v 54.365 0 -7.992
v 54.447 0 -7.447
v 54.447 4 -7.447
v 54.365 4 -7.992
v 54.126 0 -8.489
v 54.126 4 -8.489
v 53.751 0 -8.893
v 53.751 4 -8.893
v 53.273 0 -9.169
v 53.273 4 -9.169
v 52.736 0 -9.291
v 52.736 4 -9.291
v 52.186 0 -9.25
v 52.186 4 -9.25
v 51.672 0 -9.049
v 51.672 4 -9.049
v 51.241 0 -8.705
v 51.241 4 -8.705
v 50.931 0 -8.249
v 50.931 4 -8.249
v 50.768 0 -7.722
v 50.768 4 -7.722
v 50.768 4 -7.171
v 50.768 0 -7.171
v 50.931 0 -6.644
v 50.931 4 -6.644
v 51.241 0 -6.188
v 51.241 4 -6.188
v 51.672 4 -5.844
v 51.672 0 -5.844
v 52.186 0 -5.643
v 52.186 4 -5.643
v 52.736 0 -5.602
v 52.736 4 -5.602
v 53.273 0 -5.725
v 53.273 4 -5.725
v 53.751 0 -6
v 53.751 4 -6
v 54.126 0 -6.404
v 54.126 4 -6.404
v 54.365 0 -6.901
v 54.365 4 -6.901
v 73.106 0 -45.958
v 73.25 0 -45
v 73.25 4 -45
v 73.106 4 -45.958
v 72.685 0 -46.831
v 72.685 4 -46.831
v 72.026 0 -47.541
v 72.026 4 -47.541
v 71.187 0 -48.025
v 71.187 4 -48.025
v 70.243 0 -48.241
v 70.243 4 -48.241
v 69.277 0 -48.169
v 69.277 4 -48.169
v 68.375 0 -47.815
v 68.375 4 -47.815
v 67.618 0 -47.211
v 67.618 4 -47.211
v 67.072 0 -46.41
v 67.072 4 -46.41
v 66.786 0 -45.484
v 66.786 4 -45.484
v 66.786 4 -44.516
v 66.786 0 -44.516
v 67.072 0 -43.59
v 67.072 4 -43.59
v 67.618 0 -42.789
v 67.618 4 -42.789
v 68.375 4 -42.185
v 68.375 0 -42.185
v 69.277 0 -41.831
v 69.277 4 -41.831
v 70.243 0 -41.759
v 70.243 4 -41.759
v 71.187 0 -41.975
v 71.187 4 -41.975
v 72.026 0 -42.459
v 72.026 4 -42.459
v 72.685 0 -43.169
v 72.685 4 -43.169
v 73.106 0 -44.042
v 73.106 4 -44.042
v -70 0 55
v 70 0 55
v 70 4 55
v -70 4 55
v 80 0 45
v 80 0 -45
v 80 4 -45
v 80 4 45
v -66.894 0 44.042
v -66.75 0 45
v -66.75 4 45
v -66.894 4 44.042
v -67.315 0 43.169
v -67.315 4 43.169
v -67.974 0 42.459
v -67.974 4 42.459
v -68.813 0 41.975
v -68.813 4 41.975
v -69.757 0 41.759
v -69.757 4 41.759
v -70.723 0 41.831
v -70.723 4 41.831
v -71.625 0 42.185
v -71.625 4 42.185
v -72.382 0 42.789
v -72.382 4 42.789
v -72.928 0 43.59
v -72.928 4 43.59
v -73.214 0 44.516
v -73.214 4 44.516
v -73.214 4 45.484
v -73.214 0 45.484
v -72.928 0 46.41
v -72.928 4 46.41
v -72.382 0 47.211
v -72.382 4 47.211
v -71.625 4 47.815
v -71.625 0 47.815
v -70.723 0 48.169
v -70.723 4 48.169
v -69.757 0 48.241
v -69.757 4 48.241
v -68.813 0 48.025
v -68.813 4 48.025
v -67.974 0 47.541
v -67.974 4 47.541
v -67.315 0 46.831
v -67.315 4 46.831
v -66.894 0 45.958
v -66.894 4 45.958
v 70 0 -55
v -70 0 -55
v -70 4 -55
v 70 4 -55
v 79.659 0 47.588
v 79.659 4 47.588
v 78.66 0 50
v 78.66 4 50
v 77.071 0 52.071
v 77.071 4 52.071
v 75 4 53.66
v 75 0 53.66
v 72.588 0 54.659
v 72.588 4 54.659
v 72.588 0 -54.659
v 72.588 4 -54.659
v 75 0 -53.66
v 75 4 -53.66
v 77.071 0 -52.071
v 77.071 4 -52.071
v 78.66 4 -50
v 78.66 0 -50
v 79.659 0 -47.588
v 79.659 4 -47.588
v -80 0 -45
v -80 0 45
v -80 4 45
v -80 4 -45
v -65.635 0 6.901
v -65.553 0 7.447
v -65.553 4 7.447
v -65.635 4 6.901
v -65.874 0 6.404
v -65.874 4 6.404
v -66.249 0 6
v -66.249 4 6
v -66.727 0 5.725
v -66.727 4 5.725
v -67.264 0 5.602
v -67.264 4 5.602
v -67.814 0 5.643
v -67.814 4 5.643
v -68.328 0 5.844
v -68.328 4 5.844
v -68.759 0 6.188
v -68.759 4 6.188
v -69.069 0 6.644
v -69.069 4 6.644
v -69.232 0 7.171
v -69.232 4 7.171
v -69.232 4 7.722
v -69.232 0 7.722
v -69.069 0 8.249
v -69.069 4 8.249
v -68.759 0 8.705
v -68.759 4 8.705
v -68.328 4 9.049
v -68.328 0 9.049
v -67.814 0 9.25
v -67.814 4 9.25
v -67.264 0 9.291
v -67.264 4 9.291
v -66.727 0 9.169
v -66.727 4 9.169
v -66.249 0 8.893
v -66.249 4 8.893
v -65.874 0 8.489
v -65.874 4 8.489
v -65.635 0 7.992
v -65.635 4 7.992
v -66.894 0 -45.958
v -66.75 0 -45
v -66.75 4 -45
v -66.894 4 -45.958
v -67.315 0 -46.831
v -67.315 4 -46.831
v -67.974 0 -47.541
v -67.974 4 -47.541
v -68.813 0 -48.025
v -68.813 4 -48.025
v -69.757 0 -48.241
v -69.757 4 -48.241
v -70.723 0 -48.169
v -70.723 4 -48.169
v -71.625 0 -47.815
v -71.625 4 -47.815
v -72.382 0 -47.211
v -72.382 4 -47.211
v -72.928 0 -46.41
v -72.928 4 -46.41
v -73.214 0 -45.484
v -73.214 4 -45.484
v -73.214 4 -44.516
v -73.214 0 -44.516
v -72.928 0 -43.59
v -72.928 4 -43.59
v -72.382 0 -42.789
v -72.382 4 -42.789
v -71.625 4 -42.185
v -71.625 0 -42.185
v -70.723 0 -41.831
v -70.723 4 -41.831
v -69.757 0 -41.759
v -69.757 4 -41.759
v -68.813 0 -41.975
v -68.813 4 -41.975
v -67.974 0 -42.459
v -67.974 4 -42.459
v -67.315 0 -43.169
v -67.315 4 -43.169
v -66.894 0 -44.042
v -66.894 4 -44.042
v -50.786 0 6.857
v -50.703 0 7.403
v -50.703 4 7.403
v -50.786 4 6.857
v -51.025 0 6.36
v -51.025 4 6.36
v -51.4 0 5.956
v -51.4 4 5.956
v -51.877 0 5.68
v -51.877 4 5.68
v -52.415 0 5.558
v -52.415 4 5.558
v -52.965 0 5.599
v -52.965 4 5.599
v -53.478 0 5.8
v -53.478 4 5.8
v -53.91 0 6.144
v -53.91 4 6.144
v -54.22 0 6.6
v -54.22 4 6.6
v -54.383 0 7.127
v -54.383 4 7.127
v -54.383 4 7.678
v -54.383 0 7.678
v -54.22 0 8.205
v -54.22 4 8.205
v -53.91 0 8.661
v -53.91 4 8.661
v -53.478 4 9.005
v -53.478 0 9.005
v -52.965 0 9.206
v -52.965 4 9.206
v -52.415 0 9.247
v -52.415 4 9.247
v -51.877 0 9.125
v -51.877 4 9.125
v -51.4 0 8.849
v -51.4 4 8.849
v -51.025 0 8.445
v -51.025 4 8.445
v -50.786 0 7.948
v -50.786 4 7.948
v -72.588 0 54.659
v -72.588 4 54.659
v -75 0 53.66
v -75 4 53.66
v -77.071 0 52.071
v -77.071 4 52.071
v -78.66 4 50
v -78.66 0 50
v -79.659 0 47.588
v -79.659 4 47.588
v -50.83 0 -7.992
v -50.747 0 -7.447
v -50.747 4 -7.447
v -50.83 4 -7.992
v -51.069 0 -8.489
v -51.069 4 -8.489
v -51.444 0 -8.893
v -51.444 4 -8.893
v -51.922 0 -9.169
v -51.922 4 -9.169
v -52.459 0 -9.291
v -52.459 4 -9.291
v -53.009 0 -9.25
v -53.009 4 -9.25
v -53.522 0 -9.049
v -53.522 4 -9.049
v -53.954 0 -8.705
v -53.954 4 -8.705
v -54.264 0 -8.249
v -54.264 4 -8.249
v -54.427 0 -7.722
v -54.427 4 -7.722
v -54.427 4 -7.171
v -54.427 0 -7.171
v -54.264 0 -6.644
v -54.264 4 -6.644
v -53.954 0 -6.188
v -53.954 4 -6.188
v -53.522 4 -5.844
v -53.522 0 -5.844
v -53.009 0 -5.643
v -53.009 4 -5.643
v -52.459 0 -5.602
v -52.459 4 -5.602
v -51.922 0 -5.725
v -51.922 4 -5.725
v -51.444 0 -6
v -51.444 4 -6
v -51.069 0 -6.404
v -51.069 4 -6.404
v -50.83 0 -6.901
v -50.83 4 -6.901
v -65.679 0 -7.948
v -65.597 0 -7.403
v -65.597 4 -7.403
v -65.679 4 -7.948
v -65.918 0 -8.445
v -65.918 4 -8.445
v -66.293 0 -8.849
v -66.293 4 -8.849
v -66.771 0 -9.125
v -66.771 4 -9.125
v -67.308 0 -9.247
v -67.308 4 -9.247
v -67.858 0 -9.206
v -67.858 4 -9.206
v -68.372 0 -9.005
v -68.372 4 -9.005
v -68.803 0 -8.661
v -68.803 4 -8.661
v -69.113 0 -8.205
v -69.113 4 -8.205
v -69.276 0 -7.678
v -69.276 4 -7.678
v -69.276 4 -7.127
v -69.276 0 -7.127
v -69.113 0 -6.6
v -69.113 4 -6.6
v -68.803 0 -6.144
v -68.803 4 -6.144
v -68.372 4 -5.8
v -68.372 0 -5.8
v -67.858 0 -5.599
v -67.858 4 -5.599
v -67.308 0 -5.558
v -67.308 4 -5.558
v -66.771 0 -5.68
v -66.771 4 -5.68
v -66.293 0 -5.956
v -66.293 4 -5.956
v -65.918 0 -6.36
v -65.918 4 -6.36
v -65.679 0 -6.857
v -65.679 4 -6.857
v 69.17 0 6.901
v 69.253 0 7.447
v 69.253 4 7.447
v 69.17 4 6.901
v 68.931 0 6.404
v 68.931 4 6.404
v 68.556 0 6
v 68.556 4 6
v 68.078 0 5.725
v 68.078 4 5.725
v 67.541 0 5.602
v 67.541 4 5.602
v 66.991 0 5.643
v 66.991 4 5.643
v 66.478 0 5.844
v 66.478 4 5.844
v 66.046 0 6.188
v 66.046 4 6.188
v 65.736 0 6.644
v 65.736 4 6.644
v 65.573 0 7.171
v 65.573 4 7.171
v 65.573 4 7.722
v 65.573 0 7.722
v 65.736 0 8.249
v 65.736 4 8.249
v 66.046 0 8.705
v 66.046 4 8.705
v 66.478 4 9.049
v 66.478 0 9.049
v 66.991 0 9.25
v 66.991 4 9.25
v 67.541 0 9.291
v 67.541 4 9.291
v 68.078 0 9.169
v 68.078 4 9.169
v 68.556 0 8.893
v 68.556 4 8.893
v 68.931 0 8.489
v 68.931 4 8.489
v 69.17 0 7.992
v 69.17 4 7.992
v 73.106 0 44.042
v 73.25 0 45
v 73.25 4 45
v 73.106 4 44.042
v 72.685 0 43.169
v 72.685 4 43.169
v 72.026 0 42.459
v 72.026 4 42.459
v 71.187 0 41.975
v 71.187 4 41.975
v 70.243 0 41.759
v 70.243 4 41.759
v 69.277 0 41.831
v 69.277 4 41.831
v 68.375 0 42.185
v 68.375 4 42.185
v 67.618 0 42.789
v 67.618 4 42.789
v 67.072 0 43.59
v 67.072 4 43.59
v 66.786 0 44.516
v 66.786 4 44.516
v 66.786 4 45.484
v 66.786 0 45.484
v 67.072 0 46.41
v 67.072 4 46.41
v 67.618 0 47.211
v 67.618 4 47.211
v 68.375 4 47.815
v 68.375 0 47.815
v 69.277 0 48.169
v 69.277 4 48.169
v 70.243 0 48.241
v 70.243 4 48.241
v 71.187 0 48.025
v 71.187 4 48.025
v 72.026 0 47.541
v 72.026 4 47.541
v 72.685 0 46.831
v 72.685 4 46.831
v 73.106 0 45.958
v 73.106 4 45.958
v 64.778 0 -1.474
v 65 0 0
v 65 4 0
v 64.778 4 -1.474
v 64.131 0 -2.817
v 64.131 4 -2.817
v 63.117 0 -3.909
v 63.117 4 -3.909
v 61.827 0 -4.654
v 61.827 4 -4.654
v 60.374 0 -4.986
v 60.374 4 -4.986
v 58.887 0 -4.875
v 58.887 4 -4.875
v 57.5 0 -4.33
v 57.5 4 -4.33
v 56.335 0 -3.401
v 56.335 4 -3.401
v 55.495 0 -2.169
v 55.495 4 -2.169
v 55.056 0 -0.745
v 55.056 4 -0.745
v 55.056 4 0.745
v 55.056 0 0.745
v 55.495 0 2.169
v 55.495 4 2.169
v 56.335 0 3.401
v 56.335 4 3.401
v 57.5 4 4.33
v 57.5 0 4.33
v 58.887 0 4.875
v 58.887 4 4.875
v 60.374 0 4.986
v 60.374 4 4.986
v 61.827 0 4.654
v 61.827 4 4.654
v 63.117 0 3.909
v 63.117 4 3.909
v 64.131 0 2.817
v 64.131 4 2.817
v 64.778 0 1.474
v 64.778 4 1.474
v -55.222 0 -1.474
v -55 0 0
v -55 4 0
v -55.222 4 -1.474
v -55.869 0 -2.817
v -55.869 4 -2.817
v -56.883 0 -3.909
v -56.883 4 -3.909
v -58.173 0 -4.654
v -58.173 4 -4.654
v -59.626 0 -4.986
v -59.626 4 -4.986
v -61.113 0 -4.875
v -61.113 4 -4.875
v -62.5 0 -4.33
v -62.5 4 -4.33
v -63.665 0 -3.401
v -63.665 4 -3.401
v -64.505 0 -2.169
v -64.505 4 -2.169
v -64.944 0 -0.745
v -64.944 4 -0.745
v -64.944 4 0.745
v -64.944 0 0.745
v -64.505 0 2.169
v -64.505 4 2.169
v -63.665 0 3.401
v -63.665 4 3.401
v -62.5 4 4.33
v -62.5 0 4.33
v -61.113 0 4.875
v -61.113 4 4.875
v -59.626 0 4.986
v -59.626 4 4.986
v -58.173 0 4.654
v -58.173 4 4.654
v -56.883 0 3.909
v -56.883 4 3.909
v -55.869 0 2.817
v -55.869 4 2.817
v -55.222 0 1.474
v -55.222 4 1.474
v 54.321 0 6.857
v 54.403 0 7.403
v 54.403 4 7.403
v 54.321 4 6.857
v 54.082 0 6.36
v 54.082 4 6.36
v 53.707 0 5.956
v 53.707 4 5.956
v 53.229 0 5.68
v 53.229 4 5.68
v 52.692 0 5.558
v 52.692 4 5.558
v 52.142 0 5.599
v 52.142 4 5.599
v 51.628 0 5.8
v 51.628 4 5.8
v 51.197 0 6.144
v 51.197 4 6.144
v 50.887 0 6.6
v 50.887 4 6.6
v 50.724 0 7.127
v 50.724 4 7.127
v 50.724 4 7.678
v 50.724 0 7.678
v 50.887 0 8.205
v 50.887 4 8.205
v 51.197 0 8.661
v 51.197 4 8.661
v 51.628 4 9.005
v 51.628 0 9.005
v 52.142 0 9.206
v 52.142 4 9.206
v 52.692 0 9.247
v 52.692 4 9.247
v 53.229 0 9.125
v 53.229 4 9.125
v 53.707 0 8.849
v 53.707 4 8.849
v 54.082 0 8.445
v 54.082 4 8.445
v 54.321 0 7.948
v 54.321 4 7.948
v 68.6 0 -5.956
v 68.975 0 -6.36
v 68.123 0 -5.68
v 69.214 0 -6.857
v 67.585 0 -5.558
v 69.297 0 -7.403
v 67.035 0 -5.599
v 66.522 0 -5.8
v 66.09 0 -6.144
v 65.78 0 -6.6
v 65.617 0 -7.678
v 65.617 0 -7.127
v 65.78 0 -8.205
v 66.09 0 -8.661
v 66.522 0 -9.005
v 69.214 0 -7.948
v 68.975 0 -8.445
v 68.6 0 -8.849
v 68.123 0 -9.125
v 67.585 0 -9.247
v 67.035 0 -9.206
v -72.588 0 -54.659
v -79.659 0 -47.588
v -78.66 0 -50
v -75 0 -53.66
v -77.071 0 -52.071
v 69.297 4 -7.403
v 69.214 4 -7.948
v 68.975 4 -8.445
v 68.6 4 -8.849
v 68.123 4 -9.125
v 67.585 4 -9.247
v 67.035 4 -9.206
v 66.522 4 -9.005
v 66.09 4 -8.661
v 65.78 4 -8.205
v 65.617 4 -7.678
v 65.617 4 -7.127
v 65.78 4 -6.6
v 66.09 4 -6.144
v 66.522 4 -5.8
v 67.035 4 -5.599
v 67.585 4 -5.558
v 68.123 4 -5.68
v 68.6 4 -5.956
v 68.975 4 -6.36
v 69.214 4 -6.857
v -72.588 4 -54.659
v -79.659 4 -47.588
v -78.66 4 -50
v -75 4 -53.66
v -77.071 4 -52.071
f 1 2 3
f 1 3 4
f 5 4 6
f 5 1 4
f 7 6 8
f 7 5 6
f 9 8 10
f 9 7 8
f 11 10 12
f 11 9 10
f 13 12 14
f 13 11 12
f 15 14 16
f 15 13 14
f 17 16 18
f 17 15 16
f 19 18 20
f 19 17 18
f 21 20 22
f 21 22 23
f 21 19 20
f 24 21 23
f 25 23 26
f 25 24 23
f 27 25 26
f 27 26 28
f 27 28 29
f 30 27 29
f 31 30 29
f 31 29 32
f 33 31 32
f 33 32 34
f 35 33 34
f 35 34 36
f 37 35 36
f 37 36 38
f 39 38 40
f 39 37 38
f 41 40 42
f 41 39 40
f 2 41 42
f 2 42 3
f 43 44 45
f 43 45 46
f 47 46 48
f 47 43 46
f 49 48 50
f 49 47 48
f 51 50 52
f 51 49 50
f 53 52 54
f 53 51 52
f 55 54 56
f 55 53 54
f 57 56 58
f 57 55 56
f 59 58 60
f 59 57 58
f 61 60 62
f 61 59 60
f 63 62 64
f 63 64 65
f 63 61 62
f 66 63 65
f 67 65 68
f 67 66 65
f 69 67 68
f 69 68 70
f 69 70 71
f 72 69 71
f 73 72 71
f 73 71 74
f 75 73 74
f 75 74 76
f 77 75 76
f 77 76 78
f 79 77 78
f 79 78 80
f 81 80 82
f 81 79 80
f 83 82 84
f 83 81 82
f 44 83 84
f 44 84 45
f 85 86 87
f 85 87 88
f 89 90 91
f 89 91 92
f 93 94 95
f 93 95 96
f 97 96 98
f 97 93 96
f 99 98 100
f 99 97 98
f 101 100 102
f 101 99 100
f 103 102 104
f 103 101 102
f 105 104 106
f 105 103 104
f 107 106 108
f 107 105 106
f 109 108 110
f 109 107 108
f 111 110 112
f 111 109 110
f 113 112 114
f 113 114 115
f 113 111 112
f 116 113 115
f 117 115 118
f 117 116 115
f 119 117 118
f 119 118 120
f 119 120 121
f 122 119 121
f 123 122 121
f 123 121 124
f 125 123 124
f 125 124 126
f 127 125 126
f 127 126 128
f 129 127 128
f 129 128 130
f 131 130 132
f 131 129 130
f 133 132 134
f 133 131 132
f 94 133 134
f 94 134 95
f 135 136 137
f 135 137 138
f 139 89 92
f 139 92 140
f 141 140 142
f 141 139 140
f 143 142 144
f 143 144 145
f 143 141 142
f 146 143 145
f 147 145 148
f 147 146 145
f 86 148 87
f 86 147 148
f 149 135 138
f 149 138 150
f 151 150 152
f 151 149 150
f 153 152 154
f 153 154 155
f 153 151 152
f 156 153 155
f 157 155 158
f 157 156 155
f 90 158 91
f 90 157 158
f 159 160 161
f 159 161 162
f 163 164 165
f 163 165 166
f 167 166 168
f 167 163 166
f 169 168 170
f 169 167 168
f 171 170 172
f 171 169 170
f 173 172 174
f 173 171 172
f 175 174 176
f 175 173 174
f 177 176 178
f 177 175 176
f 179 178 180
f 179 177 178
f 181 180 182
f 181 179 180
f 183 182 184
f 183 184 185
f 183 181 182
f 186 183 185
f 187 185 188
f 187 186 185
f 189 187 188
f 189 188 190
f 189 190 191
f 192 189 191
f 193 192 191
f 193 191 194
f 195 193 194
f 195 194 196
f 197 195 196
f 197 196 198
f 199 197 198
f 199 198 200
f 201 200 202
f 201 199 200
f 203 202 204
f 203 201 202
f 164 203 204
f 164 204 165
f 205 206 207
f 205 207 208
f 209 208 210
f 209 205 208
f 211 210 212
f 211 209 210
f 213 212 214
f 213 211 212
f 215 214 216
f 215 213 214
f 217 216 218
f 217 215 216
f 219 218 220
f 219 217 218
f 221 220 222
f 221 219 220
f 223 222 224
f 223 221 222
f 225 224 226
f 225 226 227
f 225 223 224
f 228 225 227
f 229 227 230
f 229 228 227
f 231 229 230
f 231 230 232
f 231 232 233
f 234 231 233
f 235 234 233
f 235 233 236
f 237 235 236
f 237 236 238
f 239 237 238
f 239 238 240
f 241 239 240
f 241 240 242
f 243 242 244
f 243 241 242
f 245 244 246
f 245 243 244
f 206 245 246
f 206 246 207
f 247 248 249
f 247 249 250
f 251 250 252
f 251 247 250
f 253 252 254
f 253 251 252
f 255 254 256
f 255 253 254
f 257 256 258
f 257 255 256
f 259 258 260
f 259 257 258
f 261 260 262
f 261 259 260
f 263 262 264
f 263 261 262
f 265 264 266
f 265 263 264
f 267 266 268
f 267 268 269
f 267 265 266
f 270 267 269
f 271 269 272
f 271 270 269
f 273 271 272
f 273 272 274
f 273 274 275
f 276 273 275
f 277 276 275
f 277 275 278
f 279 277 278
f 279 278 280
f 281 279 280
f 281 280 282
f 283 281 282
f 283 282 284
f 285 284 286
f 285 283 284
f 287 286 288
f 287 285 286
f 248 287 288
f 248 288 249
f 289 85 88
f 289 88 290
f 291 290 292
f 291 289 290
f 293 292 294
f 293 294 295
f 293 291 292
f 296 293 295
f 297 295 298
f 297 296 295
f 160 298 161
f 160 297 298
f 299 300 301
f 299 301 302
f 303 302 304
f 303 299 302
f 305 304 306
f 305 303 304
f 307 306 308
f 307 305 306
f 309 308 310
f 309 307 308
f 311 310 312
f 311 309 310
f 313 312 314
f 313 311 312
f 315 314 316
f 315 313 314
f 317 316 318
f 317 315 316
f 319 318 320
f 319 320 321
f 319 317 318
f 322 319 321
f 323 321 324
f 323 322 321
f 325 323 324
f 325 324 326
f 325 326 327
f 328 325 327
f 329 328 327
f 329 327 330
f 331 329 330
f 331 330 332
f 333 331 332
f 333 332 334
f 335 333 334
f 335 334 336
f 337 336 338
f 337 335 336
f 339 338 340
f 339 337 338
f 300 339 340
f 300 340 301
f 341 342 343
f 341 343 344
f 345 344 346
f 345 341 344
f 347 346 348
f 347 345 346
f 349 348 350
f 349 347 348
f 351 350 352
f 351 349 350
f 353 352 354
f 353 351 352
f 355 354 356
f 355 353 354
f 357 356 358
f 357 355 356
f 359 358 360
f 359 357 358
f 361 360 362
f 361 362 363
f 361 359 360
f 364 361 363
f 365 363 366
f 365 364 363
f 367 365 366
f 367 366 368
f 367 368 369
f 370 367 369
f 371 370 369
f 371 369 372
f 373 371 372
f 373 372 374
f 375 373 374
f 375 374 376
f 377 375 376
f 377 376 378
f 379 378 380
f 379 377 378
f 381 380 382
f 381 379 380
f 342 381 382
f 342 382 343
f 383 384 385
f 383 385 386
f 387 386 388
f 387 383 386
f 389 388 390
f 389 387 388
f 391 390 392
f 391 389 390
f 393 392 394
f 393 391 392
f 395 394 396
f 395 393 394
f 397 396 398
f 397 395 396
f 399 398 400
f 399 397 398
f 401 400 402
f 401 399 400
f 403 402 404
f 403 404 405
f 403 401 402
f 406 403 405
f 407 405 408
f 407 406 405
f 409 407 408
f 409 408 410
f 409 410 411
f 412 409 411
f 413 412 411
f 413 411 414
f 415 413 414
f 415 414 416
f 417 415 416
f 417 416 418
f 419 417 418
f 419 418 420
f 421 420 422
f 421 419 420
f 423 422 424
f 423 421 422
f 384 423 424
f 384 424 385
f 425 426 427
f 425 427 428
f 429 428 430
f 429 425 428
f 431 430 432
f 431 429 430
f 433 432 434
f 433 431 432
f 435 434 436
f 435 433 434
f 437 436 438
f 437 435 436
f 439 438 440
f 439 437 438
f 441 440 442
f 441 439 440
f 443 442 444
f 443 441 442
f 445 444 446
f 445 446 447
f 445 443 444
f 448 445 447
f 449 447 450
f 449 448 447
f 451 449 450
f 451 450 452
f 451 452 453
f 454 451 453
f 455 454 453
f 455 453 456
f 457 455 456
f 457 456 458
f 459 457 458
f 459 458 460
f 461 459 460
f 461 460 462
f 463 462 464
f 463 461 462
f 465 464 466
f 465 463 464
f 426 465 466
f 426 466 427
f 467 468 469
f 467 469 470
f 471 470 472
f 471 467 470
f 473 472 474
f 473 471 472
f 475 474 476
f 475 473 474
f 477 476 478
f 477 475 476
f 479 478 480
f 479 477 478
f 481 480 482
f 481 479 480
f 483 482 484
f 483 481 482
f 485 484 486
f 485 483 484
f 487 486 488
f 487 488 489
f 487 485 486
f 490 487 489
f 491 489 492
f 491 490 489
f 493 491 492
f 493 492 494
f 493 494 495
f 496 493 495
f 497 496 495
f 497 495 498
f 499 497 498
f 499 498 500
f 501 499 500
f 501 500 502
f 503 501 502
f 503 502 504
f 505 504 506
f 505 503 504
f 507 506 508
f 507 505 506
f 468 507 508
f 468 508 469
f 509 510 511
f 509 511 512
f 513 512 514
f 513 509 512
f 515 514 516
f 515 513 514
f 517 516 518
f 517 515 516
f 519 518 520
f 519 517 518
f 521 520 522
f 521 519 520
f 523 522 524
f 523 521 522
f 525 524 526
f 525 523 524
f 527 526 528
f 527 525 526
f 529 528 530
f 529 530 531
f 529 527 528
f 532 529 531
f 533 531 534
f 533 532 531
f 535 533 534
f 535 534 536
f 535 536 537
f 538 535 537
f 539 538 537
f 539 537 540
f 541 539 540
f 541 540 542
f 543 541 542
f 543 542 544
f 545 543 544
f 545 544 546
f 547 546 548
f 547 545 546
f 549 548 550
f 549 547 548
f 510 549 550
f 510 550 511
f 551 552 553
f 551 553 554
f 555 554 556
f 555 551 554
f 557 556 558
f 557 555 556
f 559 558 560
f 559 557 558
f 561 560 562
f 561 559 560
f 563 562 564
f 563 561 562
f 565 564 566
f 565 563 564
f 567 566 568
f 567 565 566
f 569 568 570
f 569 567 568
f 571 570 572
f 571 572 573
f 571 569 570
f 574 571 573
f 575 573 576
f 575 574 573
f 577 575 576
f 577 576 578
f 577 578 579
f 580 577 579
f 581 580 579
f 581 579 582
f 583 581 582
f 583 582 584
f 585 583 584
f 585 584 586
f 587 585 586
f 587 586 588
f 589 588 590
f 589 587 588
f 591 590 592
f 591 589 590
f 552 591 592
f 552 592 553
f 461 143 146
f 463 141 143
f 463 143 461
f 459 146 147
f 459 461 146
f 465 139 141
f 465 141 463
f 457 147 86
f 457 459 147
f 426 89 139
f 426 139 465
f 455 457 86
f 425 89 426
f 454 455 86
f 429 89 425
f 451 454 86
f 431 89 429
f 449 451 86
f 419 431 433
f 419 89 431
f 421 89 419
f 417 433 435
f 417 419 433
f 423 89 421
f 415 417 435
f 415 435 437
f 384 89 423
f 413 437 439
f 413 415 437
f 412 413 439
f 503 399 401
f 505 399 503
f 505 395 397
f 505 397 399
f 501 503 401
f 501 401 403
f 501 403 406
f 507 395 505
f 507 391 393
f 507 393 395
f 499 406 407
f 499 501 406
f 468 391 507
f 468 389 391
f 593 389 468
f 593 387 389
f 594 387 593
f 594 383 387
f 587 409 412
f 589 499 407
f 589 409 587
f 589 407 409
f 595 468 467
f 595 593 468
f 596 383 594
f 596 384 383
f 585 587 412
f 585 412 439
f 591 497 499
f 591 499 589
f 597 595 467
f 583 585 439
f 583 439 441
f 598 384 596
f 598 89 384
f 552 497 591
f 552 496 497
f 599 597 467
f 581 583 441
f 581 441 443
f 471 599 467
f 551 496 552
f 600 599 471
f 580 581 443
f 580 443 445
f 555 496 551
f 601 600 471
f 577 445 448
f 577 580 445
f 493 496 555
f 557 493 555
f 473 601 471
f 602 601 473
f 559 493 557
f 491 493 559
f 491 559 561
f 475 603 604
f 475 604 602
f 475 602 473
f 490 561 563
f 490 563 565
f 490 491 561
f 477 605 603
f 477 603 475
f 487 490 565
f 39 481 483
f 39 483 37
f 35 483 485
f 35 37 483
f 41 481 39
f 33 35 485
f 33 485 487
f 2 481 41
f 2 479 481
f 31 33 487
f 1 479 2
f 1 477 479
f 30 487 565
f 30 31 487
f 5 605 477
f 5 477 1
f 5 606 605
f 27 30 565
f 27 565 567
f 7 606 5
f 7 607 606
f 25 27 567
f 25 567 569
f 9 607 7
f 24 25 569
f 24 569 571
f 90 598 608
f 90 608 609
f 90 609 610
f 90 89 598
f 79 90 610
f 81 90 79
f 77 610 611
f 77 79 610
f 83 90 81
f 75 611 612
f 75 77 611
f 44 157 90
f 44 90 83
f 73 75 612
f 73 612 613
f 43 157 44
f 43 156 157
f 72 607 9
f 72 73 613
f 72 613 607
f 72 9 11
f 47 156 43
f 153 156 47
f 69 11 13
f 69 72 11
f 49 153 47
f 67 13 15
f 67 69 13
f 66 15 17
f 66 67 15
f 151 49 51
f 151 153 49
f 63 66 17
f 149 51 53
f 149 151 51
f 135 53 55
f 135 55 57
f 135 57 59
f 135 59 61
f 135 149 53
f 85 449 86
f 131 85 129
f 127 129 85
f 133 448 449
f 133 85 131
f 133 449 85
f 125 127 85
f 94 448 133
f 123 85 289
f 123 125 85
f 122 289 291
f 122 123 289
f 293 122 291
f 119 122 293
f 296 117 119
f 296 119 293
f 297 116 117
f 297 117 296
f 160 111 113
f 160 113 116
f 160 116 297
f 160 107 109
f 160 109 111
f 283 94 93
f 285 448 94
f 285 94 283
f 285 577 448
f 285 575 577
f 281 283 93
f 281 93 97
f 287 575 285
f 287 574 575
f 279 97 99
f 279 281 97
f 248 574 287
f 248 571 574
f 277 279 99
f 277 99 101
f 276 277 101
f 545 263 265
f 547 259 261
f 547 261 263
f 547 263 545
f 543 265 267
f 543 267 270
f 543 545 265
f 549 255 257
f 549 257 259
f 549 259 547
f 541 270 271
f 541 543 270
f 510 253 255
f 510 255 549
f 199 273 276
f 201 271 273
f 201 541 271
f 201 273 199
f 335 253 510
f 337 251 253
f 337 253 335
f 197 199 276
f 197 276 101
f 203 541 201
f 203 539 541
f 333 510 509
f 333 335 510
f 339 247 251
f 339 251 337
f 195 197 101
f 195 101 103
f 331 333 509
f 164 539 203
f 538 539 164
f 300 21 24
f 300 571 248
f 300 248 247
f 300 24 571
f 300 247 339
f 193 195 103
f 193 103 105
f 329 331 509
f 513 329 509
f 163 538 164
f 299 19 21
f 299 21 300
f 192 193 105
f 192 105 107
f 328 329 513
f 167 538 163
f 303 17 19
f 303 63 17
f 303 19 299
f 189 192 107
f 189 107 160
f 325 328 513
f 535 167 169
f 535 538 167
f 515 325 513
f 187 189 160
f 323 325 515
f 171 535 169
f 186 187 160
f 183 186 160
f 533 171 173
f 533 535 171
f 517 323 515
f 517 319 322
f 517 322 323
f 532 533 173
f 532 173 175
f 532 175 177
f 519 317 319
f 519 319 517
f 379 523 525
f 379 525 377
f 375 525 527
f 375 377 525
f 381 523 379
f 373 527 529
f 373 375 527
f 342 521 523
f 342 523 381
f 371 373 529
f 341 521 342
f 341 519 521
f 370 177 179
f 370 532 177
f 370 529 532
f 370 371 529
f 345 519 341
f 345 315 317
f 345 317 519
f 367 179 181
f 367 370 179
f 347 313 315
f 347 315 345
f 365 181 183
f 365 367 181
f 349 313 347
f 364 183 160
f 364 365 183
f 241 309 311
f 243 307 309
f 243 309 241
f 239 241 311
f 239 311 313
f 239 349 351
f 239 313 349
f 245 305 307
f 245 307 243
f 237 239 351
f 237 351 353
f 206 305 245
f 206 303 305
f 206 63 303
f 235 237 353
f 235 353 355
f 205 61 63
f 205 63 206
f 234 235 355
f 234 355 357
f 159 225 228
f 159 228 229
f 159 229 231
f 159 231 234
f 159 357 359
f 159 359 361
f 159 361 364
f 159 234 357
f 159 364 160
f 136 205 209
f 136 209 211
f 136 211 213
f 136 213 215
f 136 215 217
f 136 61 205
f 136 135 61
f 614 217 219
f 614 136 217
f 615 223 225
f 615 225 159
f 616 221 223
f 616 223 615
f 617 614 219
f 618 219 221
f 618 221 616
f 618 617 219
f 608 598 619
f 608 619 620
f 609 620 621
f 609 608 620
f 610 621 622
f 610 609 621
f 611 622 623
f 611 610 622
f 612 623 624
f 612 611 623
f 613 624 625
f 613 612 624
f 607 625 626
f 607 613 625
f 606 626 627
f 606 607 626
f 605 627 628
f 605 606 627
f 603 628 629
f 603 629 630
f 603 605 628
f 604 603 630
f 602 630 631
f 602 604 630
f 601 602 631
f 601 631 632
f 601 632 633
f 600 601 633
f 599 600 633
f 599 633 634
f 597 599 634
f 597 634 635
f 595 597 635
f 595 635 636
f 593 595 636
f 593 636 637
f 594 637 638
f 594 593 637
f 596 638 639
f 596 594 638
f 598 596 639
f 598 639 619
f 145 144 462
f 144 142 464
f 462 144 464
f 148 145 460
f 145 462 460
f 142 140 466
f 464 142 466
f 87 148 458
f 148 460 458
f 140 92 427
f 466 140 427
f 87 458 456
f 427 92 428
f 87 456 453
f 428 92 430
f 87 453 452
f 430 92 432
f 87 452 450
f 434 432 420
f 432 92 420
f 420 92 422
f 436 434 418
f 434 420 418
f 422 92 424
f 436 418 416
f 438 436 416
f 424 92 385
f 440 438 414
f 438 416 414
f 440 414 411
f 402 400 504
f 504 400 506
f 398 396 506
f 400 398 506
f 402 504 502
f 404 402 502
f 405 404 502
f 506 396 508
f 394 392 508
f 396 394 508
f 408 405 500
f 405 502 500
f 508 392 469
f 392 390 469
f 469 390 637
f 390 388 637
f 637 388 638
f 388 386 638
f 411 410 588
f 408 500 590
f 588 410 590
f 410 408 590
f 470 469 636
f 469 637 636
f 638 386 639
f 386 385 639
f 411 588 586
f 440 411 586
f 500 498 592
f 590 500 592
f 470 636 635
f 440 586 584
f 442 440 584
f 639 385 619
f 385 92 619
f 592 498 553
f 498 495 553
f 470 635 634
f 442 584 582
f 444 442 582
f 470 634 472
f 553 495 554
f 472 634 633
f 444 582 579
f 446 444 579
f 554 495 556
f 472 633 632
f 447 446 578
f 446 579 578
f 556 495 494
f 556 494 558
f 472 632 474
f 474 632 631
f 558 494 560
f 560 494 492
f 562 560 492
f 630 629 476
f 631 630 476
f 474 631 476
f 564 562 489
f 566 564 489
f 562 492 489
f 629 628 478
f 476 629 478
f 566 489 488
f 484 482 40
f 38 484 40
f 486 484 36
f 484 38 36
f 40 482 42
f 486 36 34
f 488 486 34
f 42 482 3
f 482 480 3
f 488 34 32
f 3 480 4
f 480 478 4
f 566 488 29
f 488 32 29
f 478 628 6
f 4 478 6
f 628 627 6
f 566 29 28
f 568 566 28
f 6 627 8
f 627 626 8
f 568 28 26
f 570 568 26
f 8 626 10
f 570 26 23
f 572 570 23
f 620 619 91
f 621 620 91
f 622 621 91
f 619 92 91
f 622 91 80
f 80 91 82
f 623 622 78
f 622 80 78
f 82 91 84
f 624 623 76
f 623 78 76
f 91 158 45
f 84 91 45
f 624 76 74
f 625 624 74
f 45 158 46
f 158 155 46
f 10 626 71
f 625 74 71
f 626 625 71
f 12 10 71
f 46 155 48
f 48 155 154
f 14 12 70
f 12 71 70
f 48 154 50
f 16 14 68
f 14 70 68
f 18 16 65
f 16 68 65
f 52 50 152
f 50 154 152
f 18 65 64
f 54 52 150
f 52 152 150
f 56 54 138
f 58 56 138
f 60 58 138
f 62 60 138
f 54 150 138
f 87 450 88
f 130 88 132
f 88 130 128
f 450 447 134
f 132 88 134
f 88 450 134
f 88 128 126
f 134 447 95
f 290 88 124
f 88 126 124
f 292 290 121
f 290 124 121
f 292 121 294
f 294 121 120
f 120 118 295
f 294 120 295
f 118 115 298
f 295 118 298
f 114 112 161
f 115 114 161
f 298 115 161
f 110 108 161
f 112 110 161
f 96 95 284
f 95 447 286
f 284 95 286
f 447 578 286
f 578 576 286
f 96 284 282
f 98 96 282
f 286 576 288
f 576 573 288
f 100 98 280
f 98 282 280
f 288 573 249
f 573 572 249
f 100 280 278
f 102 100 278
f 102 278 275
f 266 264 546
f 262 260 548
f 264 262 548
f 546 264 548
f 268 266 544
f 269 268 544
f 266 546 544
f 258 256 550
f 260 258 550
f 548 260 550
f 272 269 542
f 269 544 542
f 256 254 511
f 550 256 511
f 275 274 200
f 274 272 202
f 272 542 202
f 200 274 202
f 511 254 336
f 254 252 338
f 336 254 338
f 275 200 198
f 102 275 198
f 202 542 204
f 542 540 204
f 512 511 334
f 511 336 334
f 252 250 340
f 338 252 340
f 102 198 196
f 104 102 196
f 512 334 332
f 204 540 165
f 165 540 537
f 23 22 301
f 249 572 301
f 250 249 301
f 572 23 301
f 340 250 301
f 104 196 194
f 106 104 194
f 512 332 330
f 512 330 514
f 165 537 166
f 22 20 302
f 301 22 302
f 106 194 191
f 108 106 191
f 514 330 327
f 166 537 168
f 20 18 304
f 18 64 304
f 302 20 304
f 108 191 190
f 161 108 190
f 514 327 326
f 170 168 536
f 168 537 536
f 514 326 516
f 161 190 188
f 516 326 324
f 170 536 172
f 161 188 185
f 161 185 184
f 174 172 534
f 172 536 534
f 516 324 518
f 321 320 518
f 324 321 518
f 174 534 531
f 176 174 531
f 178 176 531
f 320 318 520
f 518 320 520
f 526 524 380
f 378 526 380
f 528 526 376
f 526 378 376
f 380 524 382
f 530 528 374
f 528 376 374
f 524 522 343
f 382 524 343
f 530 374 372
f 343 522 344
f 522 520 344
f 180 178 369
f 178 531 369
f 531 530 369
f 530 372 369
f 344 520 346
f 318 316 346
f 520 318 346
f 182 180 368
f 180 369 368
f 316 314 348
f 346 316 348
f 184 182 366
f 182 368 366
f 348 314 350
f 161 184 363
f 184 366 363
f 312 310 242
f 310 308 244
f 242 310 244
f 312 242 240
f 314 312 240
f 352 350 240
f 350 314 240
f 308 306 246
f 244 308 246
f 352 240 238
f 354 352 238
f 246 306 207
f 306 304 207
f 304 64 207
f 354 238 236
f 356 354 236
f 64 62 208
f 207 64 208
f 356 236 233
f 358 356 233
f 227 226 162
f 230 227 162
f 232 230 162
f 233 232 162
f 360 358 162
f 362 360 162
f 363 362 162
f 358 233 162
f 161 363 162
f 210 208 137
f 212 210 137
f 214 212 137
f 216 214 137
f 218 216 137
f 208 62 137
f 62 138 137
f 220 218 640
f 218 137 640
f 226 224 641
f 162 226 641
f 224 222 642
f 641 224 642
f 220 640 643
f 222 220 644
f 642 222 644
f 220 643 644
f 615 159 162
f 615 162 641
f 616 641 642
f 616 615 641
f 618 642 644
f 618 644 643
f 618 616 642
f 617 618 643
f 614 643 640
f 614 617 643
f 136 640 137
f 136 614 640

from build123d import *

# Parameters (mm, degrees)
SKETCH_1_R      = 5
SKETCH_1_R_2    = 1.85
SKETCH_1_R_3    = 3.25
EXTRUDE_1_DEPTH = 4


with BuildPart() as part:
    # Эскиз1 → Бобышка-Вытянуть1 (new body)
    with BuildSketch(Plane(origin=(0, 0, 0), x_dir=(1, 0, 0), z_dir=(0, 1, 0))):
        with BuildLine():
            Line((70, -55), (-70, -55))
            ThreePointArc((-70, -55), (-77.071067812, -52.071067812), (-80, -45))
            Line((-80, -45), (-80, 45))
            ThreePointArc((-80, 45), (-77.071067812, 52.071067812), (-70, 55))
            Line((-70, 55), (70, 55))
            ThreePointArc((70, 55), (77.071067812, 52.071067812), (80, 45))
            Line((80, 45), (80, -45))
            ThreePointArc((80, -45), (77.071067812, -52.071067812), (70, -55))
        make_face()
        with Locations((-60, 0)):
            Circle(SKETCH_1_R, mode=Mode.SUBTRACT)
        with Locations((-67.446640333, 7.402536575)):
            Circle(SKETCH_1_R_2, mode=Mode.SUBTRACT)
        with Locations((-52.597463425, 7.446640333)):
            Circle(SKETCH_1_R_2, mode=Mode.SUBTRACT)
        with Locations((-52.553359667, -7.402536575)):
            Circle(SKETCH_1_R_2, mode=Mode.SUBTRACT)
        with Locations((-67.402536575, -7.446640333)):
            Circle(SKETCH_1_R_2, mode=Mode.SUBTRACT)
        with Locations((52.597463425, 7.446640333)):
            Circle(SKETCH_1_R_2, mode=Mode.SUBTRACT)
        with Locations((52.553359667, -7.402536575)):
            Circle(SKETCH_1_R_2, mode=Mode.SUBTRACT)
        with Locations((67.402536575, -7.446640333)):
            Circle(SKETCH_1_R_2, mode=Mode.SUBTRACT)
        with Locations((60, 0)):
            Circle(SKETCH_1_R, mode=Mode.SUBTRACT)
        with Locations((67.446640333, 7.402536575)):
            Circle(SKETCH_1_R_2, mode=Mode.SUBTRACT)
        with Locations((-70, 45)):
            Circle(SKETCH_1_R_3, mode=Mode.SUBTRACT)
        with Locations((-70, -45)):
            Circle(SKETCH_1_R_3, mode=Mode.SUBTRACT)
        with Locations((70, -45)):
            Circle(SKETCH_1_R_3, mode=Mode.SUBTRACT)
        with Locations((70, 45)):
            Circle(SKETCH_1_R_3, mode=Mode.SUBTRACT)
    extrude(amount=EXTRUDE_1_DEPTH)


solid = part.part
